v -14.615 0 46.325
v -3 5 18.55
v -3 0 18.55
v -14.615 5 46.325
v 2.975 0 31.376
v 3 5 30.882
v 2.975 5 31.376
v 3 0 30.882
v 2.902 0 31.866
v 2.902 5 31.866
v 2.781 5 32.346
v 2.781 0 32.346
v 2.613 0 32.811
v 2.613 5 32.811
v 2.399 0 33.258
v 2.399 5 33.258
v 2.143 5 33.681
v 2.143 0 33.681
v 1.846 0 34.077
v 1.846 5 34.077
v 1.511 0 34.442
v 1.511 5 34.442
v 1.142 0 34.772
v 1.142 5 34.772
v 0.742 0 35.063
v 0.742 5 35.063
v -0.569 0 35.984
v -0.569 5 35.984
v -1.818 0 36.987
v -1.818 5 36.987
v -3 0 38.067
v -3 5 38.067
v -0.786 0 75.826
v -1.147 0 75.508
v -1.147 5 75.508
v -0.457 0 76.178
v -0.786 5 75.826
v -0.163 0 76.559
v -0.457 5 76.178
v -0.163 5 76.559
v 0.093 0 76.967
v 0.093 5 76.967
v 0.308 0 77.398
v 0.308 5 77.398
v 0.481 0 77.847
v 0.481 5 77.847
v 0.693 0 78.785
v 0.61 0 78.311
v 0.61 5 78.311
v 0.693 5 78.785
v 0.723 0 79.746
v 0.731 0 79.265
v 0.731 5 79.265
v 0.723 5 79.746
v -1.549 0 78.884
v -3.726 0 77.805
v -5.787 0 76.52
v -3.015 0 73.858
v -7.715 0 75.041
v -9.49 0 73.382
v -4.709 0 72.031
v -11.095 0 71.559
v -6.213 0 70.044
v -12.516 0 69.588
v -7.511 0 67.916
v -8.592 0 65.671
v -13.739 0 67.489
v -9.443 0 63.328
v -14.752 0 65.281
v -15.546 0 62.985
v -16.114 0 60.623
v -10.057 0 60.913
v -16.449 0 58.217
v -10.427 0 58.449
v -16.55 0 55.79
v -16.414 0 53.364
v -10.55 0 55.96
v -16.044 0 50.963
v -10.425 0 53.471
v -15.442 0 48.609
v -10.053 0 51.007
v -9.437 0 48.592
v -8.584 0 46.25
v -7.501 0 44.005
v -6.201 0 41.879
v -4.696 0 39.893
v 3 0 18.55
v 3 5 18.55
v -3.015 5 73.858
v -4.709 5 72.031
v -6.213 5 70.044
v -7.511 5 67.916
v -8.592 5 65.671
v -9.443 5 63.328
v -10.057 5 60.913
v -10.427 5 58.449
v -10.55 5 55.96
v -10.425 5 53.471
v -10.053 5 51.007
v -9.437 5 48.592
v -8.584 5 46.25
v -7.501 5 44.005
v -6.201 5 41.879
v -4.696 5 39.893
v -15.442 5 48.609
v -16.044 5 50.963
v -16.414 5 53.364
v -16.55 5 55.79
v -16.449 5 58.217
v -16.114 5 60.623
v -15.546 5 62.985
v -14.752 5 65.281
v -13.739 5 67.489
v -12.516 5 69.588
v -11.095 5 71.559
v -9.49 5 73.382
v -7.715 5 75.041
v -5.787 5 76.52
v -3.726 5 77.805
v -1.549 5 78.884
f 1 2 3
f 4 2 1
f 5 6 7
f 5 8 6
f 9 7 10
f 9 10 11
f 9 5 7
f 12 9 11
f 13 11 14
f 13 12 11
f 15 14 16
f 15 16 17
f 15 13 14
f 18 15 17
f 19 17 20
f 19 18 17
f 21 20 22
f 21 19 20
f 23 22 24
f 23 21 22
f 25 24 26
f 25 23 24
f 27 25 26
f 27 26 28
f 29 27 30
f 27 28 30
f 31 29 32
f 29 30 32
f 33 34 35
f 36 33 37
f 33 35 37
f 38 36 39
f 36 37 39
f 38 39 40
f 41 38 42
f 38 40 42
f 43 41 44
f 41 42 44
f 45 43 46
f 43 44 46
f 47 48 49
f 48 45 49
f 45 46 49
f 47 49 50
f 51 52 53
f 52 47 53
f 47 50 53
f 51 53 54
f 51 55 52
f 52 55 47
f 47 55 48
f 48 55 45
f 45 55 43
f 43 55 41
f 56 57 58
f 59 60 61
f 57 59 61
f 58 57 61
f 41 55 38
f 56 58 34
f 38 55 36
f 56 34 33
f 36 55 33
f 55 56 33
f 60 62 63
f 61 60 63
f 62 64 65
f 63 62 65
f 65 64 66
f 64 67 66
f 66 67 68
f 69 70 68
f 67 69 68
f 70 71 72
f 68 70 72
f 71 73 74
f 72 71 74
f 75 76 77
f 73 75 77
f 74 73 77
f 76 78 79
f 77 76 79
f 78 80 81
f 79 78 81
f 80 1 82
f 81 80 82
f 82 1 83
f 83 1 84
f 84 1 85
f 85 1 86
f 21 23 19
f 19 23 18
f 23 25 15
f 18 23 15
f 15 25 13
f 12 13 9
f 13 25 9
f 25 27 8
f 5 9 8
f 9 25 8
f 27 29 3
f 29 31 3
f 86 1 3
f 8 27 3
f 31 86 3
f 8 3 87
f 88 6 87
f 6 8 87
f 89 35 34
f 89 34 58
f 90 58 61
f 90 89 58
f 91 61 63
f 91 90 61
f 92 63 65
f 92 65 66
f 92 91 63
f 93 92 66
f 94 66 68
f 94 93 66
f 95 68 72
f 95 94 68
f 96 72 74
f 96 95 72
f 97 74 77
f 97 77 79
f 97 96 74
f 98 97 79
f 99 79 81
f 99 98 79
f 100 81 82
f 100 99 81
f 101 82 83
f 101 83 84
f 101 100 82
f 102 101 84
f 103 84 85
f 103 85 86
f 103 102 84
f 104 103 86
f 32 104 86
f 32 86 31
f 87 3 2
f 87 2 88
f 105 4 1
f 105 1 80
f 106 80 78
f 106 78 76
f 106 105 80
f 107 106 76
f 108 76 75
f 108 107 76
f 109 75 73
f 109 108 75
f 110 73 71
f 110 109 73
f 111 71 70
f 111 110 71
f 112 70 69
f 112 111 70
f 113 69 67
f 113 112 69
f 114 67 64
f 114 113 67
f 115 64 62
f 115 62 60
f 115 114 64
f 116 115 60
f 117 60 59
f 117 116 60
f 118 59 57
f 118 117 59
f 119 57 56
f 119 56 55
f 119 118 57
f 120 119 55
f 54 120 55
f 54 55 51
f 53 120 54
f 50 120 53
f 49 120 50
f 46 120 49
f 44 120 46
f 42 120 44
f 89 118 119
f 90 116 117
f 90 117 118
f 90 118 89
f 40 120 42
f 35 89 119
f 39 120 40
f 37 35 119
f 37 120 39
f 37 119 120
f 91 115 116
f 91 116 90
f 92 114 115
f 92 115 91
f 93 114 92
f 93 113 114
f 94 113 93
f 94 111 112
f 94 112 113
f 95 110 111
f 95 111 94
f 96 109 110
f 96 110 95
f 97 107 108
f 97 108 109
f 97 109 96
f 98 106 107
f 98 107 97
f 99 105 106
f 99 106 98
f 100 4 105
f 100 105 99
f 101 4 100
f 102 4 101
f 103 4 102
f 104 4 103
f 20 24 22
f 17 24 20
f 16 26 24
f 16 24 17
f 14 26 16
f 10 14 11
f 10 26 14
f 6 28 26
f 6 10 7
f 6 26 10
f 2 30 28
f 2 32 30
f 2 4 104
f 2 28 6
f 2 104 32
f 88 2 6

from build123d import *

# Parameters (mm, degrees)
EXTRUDE_2_DEPTH     = 5
SKETCH_4_R          = 1.65
CUT_EXTRUDE_1_DEPTH = 5
EXTRUDE_3_DEPTH     = 5
CUT_EXTRUDE_START   = -4.5
SKETCH_7_R          = 3
CUT_EXTRUDE_2_DEPTH = 3
CUT_EXTRUDE_3_DEPTH = 7.5
EXTRUDE_4_DEPTH     = 5
FILLET_1_R          = 5
FILLET_2_R          = 5
CUT_EXTRUDE_START_2 = -5
CUT_EXTRUDE_5_DEPTH = 5


with BuildPart() as part:
    # 草图3 → 凸台-拉伸2 (new body)
    with BuildSketch(Plane(origin=(0, 0, 0), x_dir=(1, 0, 0), z_dir=(0, 1, 0))):
        with BuildLine():
            Line((-3, -3.354101966), (-3, -7.416198487))
            Line((-3, -7.416198487), (-3, -43.854101966))
            Line((-3, -43.854101966), (3, -43.854101966))
            Line((3, -43.854101966), (3, -10.583005244))
            Line((3, -10.583005244), (3, -7.416198487))
            Line((3, -7.416198487), (3, -3.354101966))
            ThreePointArc((3, -3.354101966), (0, 4.5), (-3, -3.354101966))
        make_face()
    extrude(amount=EXTRUDE_2_DEPTH)

    # 草图4 → 切除-拉伸1 (cut)
    with BuildSketch(Plane(origin=(0, 5, 0), x_dir=(1, 0, 0), z_dir=(0, 1, 0))):
        with Locations(Location((0, 0, 0), (0, 0, 270))):
            Circle(SKETCH_4_R)
    extrude(amount=-CUT_EXTRUDE_1_DEPTH, mode=Mode.SUBTRACT)

    # 草图6 → 凸台-拉伸3 (add)
    with BuildSketch(Plane(origin=(0, 5, 0), x_dir=(1, 0, 0), z_dir=(0, 1, 0))):
        with BuildLine():
            Line((3, -33.74604712), (-3, -33.74604712))
            ThreePointArc((-3, -33.74604712), (-16.46902092, -57.986607816), (0.722500961, -79.745993902))
            Line((0.722500961, -79.745993902), (1.949520222, -77.620734201))
            ThreePointArc((1.949520222, -77.620734201), (-10.543317179, -55.371702353), (3, -33.74604712))
        make_face()
    extrude(amount=-EXTRUDE_3_DEPTH)

    # 草图7 → 切除-拉伸2 (cut)
    with BuildSketch(Plane(origin=(0, 5, 0), x_dir=(1, 0, 0), z_dir=(0, 1, 0)).offset(CUT_EXTRUDE_START)):
        with Locations(Location((0, 0, 0), (0, 0, 270))):
            Circle(SKETCH_7_R)
    extrude(amount=-CUT_EXTRUDE_2_DEPTH, mode=Mode.SUBTRACT)

    # 草图8 → 切除-拉伸3 (cut)
    with BuildSketch(Plane(origin=(0, 5, 0), x_dir=(1, 0, 0), z_dir=(0, 1, 0))):
        with BuildLine():
            Line((-3, -38.067187498), (-3, -43.854101966))
            Line((-3, -43.854101966), (3, -43.854101966))
            Line((3, -43.854101966), (3, -33.74604712))
            ThreePointArc((3, -33.74604712), (-0.160637142, -35.683569047), (-3, -38.067187498))
        make_face()
    extrude(amount=-CUT_EXTRUDE_3_DEPTH, mode=Mode.SUBTRACT)

    # 草图9 → 凸台-拉伸4 (add)
    with BuildSketch(Plane(origin=(0, 5, 0), x_dir=(1, 0, 0), z_dir=(0, 1, 0))):
        with BuildLine():
            Line((-3, -18.550074543), (-14.614967684, -46.324924269))
            ThreePointArc((-14.614967684, -46.324924269), (-9.917875534, -39.010182445), (-3, -33.74604712))
            Line((-3, -33.74604712), (-3, -18.550074543))
        make_face()
    extrude(amount=-EXTRUDE_4_DEPTH)

    # 圆角1
    fillet_1_edges = [part.edges().sort_by_distance(p)[0] for p in [
        (3, 2.5, 33.74604712),
    ]]
    fillet(fillet_1_edges, radius=FILLET_1_R)

    # 圆角2
    # the kernel refuses this fillet: 5 mm, written as the material it takes off along each edge
    with BuildSketch(Plane(origin=(1.949520222, 14.371610933, 77.620734201), x_dir=(-0.8261015944022844, 0, -0.5635212114250925), z_dir=(0, -1, 0))) as fillet_2_piece_1:
        with BuildLine():
            CenterArc((4.123508811, -4.985927863), FILLET_2_R, 94.299664485, 55.185648669)
            Line((-0.183986354, -2.447131808), (-0.270136257, -2.396355887))
            ThreePointArc((-0.270136257, -2.396355887), (-0.191711734, -1.216068615), (-0.099718557, 0.007497289))
            Line((-0.099718557, 0.007497289), (0.007497289, 0.099718557))
            ThreePointArc((0.007497289, 0.099718557), (1.874322187, 0.029639314), (3.741147084, 0.099718557))
            Line((3.741147084, 0.099718557), (3.748644373, 0))
        make_face()
    extrude(amount=23.743221866, mode=Mode.SUBTRACT)

    # 草图10 → 切除-拉伸5 (cut)
    with BuildSketch(Plane(origin=(0, 5, 0), x_dir=(1, 0, 0), z_dir=(0, 1, 0)).offset(CUT_EXTRUDE_START_2)):
        with BuildLine():
            Line((-3, -18.550074543), (3, -18.550074543))
            Line((3, -18.550074543), (3, -3.354101966))
            ThreePointArc((3, -3.354101966), (0, 4.5), (-3, -3.354101966))
            Line((-3, -3.354101966), (-3, -18.550074543))
        make_face()
    extrude(amount=CUT_EXTRUDE_5_DEPTH, mode=Mode.SUBTRACT)


solid = part.part
